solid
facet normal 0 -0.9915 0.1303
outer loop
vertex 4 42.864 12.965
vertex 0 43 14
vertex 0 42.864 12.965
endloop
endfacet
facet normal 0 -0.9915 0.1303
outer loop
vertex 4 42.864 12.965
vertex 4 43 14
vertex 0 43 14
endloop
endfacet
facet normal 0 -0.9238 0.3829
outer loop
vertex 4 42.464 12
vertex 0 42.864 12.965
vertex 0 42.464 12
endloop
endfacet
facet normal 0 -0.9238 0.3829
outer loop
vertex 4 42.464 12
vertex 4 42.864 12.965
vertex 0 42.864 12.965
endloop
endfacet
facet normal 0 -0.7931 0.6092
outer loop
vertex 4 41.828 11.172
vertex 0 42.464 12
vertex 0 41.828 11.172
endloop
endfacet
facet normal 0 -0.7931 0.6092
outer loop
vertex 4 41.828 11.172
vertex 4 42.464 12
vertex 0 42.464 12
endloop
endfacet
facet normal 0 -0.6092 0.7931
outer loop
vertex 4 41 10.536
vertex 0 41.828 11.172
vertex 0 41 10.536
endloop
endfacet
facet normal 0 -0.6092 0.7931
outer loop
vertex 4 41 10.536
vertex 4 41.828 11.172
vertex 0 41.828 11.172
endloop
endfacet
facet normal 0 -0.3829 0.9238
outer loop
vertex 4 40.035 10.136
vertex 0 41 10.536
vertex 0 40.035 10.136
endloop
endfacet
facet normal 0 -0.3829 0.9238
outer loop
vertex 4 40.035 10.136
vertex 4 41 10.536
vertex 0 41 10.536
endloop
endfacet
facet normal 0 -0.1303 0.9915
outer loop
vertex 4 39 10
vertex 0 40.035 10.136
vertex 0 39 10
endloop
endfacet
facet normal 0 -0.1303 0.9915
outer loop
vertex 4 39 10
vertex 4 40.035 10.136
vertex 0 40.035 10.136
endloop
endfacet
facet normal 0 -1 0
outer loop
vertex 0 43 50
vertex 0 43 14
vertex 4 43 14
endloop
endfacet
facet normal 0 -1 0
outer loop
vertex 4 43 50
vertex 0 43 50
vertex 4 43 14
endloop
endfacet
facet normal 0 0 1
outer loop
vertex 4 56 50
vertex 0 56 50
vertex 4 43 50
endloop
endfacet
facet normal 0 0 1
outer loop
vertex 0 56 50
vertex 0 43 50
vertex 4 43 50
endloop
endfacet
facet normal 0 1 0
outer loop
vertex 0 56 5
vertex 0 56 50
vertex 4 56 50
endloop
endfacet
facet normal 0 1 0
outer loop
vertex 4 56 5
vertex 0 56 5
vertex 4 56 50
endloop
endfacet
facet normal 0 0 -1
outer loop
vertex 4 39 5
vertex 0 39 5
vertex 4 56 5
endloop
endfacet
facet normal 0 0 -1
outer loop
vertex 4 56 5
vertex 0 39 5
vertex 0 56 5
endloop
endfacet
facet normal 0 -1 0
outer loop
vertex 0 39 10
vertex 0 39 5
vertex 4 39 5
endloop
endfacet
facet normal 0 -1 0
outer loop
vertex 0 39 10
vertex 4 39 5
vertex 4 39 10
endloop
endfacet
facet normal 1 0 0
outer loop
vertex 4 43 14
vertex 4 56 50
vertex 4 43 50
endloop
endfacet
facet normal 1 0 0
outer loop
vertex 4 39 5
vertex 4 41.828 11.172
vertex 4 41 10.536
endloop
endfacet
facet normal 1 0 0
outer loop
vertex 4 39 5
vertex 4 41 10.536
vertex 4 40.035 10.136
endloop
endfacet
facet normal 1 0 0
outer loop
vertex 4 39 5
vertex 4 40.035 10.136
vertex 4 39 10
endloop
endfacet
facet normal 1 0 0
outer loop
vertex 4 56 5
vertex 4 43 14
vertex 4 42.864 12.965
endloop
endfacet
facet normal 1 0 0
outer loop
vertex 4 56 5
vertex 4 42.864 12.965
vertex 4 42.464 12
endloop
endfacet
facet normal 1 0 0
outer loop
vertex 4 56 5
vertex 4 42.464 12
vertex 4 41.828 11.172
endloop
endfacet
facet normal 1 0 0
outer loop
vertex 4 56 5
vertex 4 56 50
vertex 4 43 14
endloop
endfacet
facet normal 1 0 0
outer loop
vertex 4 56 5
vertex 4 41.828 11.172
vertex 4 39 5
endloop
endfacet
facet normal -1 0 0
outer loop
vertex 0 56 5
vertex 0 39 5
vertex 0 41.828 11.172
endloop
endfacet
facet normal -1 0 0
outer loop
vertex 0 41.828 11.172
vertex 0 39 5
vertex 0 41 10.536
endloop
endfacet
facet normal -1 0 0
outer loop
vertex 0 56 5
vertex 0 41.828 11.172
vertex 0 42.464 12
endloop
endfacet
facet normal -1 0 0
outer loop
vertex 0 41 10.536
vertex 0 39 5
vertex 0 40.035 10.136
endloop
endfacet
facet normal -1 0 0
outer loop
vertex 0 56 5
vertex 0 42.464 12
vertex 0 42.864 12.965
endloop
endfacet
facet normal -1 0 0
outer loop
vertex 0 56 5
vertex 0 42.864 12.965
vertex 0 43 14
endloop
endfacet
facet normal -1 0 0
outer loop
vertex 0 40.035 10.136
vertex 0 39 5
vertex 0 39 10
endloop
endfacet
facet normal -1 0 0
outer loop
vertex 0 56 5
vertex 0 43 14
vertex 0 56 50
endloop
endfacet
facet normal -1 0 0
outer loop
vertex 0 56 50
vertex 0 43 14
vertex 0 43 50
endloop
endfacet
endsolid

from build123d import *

# Parameters (mm, degrees)
SKETCH1_W            = 48
SKETCH1_H            = 53
BOSS_EXTRUDE1_DEPTH  = 10
SKETCH2_W            = 48
SKETCH2_H            = 5.616325
BOSS_EXTRUDE2_DEPTH  = 33.1917878
SKETCH4_W            = 4
SKETCH4_H            = 10
BOSS_EXTRUDE4_DEPTH  = 40
SKETCH5_W            = 48
SKETCH5_H            = 10.8609375
BOSS_EXTRUDE5_DEPTH  = 23.1917878
SKETCH6_W            = 48
SKETCH6_H            = 5
BOSS_EXTRUDE6_DEPTH  = 42.3
SKETCH7_W            = 12.8082122
SKETCH7_H            = 16.4772625
BOSS_EXTRUDE7_DEPTH  = 48
CUT_EXTRUDE1_REACH   = 84.426
SKETCH8_R            = 11.5
SKETCH8_R_2          = 2
FILLET1_R            = 10
FILLET2_R            = 4
SKETCH9_W            = 5
SKETCH9_H            = 16.4772625
BOSS_EXTRUDE9_DEPTH  = 48
CUT_EXTRUDE2_DEPTH   = 6
SKETCH11_R           = 1.9304
CUT_EXTRUDE3_DEPTH   = 6
BOSS_EXTRUDE11_DEPTH = 3
SKETCH14_W           = 146.253560905
SKETCH14_H           = 143.633383104
SKETCH14_W_2         = 45
SKETCH14_H_2         = 17
CUT_EXTRUDE5_DEPTH   = 90.10667764
SKETCH15_W           = 68.343124148
SKETCH15_H           = 38.24816948
CUT_EXTRUDE6_DEPTH   = 44


with BuildPart() as part:
    # Sketch1 → Boss-Extrude1 (new body)
    with BuildSketch(Plane.XY):
        with Locations((24, 26.5)):
            Rectangle(SKETCH1_W, SKETCH1_H)
    extrude(amount=BOSS_EXTRUDE1_DEPTH)

    # Sketch2 → Boss-Extrude2 (add)
    with BuildSketch(Plane(origin=(0, 0, 0), x_dir=(-1, 0, 0), z_dir=(0, 0, -1))):
        with Locations((-24, -2.8081625)):
            Rectangle(SKETCH2_W, SKETCH2_H)
    extrude(amount=-BOSS_EXTRUDE2_DEPTH)

    # Sketch4 → Boss-Extrude4 (add)
    with BuildSketch(Plane.XY.offset(10)):
        with Locations((2, 48)):
            Rectangle(SKETCH4_W, SKETCH4_H)
        with Locations((46, 48)):
            Rectangle(SKETCH4_W, SKETCH4_H)
    extrude(amount=BOSS_EXTRUDE4_DEPTH)

    # Sketch5 → Boss-Extrude5 (add)
    with BuildSketch(Plane.XY.offset(10)):
        with Locations((24, 5.43046875)):
            Rectangle(SKETCH5_W, SKETCH5_H)
    extrude(amount=BOSS_EXTRUDE5_DEPTH)

    # Sketch6 → Boss-Extrude6 (add)
    with BuildSketch(Plane.XZ.offset(5.616325)):
        with Locations((24, 30.6917878)):
            Rectangle(SKETCH6_W, SKETCH6_H)
    extrude(amount=BOSS_EXTRUDE6_DEPTH)

    # Sketch7 → Boss-Extrude7 (add)
    with BuildSketch(Plane.ZY):
        with Locations((-6.4041061, 2.62230625)):
            Rectangle(SKETCH7_W, SKETCH7_H)
    extrude(amount=-BOSS_EXTRUDE7_DEPTH)

    # Sketch8 → Cut-Extrude1 (cut, up to next)
    with BuildSketch(Plane(origin=(0, 0, 28.1917878), x_dir=(-1, 0, 0), z_dir=(0, 0, -1)), mode=Mode.PRIVATE) as cut_extrude1_sk1:
        with Locations((-24, -26.616325)):
            Circle(SKETCH8_R)
    cut_extrude1_tool1 = extrude(cut_extrude1_sk1.sketch, amount=-CUT_EXTRUDE1_REACH, mode=Mode.PRIVATE) & part.part
    # Sketch8 → Cut-Extrude1 (cut, up to next)
    with BuildSketch(Plane(origin=(0, 0, 28.1917878), x_dir=(-1, 0, 0), z_dir=(0, 0, -1)), mode=Mode.PRIVATE) as cut_extrude1_sk2:
        with Locations((-39.5, -11.116325)):
            Circle(SKETCH8_R_2)
    cut_extrude1_tool2 = extrude(cut_extrude1_sk2.sketch, amount=-CUT_EXTRUDE1_REACH, mode=Mode.PRIVATE) & part.part
    # Sketch8 → Cut-Extrude1 (cut, up to next)
    with BuildSketch(Plane(origin=(0, 0, 28.1917878), x_dir=(-1, 0, 0), z_dir=(0, 0, -1)), mode=Mode.PRIVATE) as cut_extrude1_sk3:
        with Locations((-39.5, -42.116325)):
            Circle(SKETCH8_R_2)
    cut_extrude1_tool3 = extrude(cut_extrude1_sk3.sketch, amount=-CUT_EXTRUDE1_REACH, mode=Mode.PRIVATE) & part.part
    # Sketch8 → Cut-Extrude1 (cut, up to next)
    with BuildSketch(Plane(origin=(0, 0, 28.1917878), x_dir=(-1, 0, 0), z_dir=(0, 0, -1)), mode=Mode.PRIVATE) as cut_extrude1_sk4:
        with Locations((-8.5, -11.116325)):
            Circle(SKETCH8_R_2)
    cut_extrude1_tool4 = extrude(cut_extrude1_sk4.sketch, amount=-CUT_EXTRUDE1_REACH, mode=Mode.PRIVATE) & part.part
    # Sketch8 → Cut-Extrude1 (cut, up to next)
    with BuildSketch(Plane(origin=(0, 0, 28.1917878), x_dir=(-1, 0, 0), z_dir=(0, 0, -1)), mode=Mode.PRIVATE) as cut_extrude1_sk5:
        with Locations((-8.5, -42.116325)):
            Circle(SKETCH8_R_2)
    cut_extrude1_tool5 = extrude(cut_extrude1_sk5.sketch, amount=-CUT_EXTRUDE1_REACH, mode=Mode.PRIVATE) & part.part
    add(cut_extrude1_tool1.solids().sort_by_distance((24, -26.616325, 28.191788))[0], mode=Mode.SUBTRACT)
    add(cut_extrude1_tool2.solids().sort_by_distance((39.5, -11.116325, 28.191788))[0], mode=Mode.SUBTRACT)
    add(cut_extrude1_tool3.solids().sort_by_distance((39.5, -42.116325, 28.191788))[0], mode=Mode.SUBTRACT)
    add(cut_extrude1_tool4.solids().sort_by_distance((8.5, -11.116325, 28.191788))[0], mode=Mode.SUBTRACT)
    add(cut_extrude1_tool5.solids().sort_by_distance((8.5, -42.116325, 28.191788))[0], mode=Mode.SUBTRACT)

    # Fillet1
    fillet1_edges = [part.edges().sort_by_distance(p)[0] for p in [
        (24, 10.8609375, 0),
    ]]
    fillet(fillet1_edges, radius=FILLET1_R)

    # Fillet2
    fillet2_edges = [part.edges().sort_by_distance(p)[0] for p in [
        (2, 43, 10),
        (46, 43, 10),
    ]]
    fillet(fillet2_edges, radius=FILLET2_R)

    # Sketch9 → Boss-Extrude9 (add)
    with BuildSketch(Plane(origin=(48, 0, 0), x_dir=(0, 0, -1), z_dir=(1, 0, 0))):
        with Locations((15.3082122, 2.62230625)):
            Rectangle(SKETCH9_W, SKETCH9_H)
    extrude(amount=-BOSS_EXTRUDE9_DEPTH)

    # Sketch10 → Cut-Extrude2 (cut)
    with BuildSketch(Plane.XY.offset(10)):
        Polygon((12.429, 36.979734073), (9, 38.959468146), (5.571, 36.979734073), (5.571, 33.020265927), (9, 31.040531854), (12.429, 33.020265927), align=None)
        Polygon((35.571, 36.979734073), (35.571, 33.020265927), (39, 31.040531854), (42.429, 33.020265927), (42.429, 36.979734073), (39, 38.959468146), align=None)
    extrude(amount=-CUT_EXTRUDE2_DEPTH, mode=Mode.SUBTRACT)

    # Sketch11 → Cut-Extrude3 (cut)
    with BuildSketch(Plane.XY.offset(4)):
        with Locations((9, 35)):
            Circle(SKETCH11_R)
        with Locations((39, 35)):
            Circle(SKETCH11_R)
    extrude(amount=-CUT_EXTRUDE3_DEPTH, mode=Mode.SUBTRACT)

    # Sketch12 → Boss-Extrude11 (add)
    with BuildSketch(Plane(origin=(0, 53, 0), x_dir=(1, 0, 0), z_dir=(0, 1, 0))):
        Polygon((0, 0), (0, -50), (4, -50), (4, -10), (44, -10), (44, -50), (48, -50), (48, 0), align=None)
    extrude(amount=BOSS_EXTRUDE11_DEPTH)

    # Sketch14 → Cut-Extrude5 (cut, through all)
    with BuildSketch(Plane.ZY):
        with Locations((21.574447485, 12.73606384)):
            Rectangle(SKETCH14_W, SKETCH14_H)
        with Locations((27.5, 47.5)):
            Rectangle(SKETCH14_W_2, SKETCH14_H_2, mode=Mode.SUBTRACT)
    extrude(amount=-CUT_EXTRUDE5_DEPTH, mode=Mode.SUBTRACT)

    # Sketch15 → Cut-Extrude6 (cut)
    with BuildSketch(Plane(origin=(48, 0, 0), x_dir=(0, 0, -1), z_dir=(1, 0, 0))):
        with Locations((-31.986382943, 43.740124775)):
            Rectangle(SKETCH15_W, SKETCH15_H)
    extrude(amount=-CUT_EXTRUDE6_DEPTH, mode=Mode.SUBTRACT)


solid = part.part
